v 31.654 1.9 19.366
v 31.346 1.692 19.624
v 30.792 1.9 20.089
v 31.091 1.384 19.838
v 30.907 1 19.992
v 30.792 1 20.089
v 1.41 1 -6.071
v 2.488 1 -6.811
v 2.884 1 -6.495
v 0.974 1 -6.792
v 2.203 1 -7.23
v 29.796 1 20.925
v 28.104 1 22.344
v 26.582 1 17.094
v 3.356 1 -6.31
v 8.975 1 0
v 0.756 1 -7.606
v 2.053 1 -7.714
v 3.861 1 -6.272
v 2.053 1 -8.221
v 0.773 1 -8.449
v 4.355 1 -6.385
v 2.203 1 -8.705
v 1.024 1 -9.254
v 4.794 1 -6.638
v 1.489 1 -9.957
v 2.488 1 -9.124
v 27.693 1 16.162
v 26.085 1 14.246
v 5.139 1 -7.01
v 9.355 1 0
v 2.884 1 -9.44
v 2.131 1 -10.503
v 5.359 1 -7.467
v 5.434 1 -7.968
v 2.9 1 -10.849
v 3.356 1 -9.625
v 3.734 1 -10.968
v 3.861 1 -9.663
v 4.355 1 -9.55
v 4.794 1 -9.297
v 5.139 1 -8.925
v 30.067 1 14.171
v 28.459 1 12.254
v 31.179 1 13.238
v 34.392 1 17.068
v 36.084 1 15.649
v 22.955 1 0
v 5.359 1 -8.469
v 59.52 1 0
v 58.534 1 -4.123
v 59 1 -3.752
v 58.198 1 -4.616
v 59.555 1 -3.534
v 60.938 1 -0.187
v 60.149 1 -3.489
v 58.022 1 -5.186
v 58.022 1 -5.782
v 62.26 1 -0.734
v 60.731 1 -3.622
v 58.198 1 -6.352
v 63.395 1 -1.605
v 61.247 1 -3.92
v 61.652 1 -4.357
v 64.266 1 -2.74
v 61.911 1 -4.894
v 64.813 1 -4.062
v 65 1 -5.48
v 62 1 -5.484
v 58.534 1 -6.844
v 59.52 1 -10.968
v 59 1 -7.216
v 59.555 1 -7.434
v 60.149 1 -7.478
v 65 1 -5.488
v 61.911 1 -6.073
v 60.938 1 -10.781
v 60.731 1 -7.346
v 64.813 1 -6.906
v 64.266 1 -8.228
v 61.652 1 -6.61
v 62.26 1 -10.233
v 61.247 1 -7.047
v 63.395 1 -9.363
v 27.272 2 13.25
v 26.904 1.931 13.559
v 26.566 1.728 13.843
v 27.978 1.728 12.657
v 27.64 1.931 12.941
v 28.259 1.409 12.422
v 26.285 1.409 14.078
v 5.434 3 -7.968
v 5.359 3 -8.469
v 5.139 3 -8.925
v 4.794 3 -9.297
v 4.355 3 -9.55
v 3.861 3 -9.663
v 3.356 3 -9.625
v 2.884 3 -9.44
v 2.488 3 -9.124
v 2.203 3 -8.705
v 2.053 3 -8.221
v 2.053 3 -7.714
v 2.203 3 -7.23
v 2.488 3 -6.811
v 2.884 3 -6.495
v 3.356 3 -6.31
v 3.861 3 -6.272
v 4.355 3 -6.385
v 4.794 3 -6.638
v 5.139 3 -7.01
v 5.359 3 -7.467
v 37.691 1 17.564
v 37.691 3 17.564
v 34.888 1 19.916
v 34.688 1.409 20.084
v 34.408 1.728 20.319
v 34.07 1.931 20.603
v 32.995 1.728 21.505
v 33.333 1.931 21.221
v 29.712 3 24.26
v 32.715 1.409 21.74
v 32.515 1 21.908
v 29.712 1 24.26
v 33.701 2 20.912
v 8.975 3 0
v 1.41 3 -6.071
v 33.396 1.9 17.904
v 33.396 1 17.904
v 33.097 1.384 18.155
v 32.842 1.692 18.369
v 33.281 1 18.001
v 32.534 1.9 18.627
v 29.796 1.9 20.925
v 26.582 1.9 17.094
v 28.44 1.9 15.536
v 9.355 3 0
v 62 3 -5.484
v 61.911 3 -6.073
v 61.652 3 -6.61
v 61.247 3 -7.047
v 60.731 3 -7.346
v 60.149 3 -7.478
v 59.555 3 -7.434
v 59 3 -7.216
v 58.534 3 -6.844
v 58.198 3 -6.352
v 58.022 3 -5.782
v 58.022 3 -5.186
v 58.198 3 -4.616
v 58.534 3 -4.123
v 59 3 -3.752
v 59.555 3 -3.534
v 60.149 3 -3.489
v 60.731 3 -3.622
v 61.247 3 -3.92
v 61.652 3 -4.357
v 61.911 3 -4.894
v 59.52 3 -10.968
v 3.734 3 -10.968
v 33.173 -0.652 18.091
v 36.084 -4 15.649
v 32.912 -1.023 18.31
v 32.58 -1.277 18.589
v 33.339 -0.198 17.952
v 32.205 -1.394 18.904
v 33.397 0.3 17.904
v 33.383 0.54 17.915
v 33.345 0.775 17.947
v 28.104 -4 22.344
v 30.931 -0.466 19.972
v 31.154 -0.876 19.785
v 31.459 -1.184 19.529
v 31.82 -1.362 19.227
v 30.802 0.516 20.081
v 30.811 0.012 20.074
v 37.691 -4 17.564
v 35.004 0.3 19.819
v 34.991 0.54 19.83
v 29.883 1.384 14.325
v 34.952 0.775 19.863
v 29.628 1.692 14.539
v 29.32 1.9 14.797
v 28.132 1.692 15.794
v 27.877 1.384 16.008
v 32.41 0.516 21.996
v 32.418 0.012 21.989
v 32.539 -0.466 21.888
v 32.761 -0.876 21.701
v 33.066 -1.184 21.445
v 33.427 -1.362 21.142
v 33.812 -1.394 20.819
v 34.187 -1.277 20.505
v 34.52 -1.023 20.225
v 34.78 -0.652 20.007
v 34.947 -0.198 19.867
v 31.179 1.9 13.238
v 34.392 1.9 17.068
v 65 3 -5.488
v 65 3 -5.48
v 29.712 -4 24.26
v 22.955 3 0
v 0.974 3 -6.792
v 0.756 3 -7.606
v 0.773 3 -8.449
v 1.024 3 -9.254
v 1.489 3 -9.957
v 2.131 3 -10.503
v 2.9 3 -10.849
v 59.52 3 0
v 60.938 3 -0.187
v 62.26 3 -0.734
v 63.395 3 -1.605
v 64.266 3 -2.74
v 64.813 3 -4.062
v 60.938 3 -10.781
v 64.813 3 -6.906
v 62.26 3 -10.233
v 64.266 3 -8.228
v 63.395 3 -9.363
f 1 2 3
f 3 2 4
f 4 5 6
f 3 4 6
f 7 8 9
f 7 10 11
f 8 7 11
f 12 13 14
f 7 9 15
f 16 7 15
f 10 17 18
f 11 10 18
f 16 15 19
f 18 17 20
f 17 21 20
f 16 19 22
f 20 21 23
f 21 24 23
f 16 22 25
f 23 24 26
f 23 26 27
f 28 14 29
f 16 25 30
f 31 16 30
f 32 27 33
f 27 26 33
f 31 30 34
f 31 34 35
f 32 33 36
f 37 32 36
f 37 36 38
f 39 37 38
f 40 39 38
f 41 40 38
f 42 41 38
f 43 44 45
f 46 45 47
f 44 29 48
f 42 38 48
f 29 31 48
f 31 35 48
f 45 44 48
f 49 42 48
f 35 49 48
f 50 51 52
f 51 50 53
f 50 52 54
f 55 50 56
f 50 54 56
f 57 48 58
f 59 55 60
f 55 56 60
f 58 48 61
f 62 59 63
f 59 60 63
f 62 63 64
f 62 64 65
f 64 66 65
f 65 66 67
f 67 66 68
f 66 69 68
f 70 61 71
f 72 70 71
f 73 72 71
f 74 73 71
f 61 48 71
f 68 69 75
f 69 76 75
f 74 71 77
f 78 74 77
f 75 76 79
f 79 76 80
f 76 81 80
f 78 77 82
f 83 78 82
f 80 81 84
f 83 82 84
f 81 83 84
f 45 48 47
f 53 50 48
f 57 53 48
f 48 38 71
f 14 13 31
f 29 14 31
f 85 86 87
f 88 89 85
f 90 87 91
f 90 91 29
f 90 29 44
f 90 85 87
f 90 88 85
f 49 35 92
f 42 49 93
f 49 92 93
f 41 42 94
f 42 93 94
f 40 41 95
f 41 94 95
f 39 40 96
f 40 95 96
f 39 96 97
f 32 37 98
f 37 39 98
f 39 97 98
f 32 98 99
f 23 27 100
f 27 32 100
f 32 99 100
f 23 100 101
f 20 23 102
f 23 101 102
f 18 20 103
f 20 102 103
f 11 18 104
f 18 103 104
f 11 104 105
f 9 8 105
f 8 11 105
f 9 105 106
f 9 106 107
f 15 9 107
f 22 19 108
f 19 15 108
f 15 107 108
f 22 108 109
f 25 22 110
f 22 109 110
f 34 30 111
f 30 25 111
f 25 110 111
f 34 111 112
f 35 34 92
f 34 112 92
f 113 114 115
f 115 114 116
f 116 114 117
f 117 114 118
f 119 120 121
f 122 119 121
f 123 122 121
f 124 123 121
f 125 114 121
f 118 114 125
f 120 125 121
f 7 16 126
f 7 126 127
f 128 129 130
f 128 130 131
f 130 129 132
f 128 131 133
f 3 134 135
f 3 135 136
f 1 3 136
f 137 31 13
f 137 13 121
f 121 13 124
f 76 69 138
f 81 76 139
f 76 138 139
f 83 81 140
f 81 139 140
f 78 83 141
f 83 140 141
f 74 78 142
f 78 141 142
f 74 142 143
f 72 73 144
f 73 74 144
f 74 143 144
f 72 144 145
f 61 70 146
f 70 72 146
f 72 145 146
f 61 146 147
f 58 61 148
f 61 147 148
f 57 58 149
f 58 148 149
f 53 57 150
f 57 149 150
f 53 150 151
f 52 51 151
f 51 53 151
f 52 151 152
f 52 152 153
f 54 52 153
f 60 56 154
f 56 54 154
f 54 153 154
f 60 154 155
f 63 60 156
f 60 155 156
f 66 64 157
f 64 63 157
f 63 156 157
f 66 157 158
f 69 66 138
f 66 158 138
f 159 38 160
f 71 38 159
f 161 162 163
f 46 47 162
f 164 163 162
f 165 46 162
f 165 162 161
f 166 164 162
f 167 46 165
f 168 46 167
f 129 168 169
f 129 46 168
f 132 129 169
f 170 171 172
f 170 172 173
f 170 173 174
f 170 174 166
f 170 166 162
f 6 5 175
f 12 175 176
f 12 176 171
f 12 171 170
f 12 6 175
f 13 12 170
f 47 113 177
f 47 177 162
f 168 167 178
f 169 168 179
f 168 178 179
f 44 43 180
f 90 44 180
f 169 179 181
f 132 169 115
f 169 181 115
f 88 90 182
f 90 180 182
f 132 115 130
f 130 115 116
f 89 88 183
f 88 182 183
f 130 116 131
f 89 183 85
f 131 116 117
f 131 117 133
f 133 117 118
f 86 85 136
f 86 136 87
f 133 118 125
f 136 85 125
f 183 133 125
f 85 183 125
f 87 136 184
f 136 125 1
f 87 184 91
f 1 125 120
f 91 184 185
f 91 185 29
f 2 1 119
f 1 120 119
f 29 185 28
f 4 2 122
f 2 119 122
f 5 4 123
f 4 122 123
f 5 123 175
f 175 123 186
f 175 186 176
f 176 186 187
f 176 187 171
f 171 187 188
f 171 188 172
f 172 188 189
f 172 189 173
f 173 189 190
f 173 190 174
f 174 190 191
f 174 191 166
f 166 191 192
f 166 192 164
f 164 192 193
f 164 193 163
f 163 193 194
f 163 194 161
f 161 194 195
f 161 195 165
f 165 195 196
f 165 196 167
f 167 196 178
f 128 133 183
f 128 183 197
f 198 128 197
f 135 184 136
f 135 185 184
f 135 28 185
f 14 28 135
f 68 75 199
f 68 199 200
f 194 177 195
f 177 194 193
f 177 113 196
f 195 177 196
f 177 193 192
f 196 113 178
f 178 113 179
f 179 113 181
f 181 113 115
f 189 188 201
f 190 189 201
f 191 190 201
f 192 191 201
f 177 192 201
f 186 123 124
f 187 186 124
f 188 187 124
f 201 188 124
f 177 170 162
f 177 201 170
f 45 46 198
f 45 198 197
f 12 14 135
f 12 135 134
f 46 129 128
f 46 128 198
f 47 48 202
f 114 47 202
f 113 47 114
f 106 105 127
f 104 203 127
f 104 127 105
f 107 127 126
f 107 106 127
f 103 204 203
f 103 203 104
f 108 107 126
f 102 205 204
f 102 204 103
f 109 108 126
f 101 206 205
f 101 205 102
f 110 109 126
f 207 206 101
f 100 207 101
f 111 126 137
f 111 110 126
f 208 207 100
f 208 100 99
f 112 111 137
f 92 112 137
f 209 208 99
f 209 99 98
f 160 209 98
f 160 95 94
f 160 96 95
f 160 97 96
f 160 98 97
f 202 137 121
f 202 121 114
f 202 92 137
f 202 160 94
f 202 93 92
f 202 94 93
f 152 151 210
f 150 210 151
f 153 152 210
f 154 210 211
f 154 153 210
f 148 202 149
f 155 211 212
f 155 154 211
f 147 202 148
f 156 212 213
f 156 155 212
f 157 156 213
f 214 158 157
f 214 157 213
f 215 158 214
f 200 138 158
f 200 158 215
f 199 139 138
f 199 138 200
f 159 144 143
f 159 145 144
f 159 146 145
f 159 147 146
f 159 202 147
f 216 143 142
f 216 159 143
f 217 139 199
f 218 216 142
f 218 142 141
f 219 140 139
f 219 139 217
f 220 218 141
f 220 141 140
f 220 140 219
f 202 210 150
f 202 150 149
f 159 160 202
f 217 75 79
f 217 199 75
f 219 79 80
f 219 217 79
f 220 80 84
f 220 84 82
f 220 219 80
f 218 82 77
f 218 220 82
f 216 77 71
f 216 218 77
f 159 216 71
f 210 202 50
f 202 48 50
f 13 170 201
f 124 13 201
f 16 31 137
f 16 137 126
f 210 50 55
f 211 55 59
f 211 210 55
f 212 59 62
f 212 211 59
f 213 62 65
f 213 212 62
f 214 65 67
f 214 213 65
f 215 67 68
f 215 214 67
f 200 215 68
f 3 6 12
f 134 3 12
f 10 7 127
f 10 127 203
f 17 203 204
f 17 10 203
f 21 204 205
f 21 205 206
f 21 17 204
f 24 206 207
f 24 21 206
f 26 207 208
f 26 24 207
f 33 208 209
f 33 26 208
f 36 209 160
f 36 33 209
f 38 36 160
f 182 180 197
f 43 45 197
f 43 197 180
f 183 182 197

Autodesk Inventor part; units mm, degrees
ref_plane "YZ Plane" through (0, 0, 0) normal (1, 0, 0) x (0, 1, 0)
ref_plane "XZ Plane" through (0, 0, 0) normal (0, 1, 0) x (-1, 0, 0)
ref_plane "XY Plane" through (0, 0, 0) normal (0, 0, 1) x (1, 0, 0)
sketch "Boceto1" plane through (0, 0, 0) normal (0, 1, 0) x (-1, 0, 0)
  line L0 (-2.031, 0) -> (-63, 0)
  line L1 (-65, -2) -> (-65, -8.0305)
  line L2 (-62.8998, -10.9676) -> (-2.0305, -10.9676)
  line L3 (0, -8.9987) -> (0, -2.031)
  line L4 (0, -8.9987) -> (0, -10.9676)
  line L5 (0, -10.9676) -> (-2.0305, -10.9676)
  line L6 (0, -2.031) -> (0, 0)
  line L7 (-65, -8.0305) -> (-65, -10.9676)
  line L8 (-65, -10.9676) -> (-62.8998, -10.9676)
  line L9 (-65, -2) -> (-65, 0)
  line L10 (-63, 0) -> (-65, 0)
  line L11 (0, 0) -> (-2.031, 0)
  dimension "d0" = 65
extrude "Extrusión1" add sketch "Boceto1" along normal blind 3
sketch "Boceto2" plane through (0, 3, 0) normal (0, 1, 0) x (1, 0, 0)
  line L0 (0, 10.9676) -> (0, 0) projected
  circle A0 centre (5, 5.4838) radius 2
  line L1 (65, 0) -> (65, 10.9676) projected
  circle A1 centre (60, 5.4838) radius 2
  line L2 (65, 5.4838) -> (60, 5.4838)
  line L3 (0, 5.4838) -> (5, 5.4838)
  point P0 (0.1384, 8.9976)
  point P1 (0.0312, 2.0308)
  point P2 (65, 2)
  point P3 (65, 8.0305)
  dimension "d20" = 5
  dimension "d31" = 4
  dimension "d32" = 4
extrude "Extrusión2" cut sketch "Boceto2" against normal blind 5
sketch "Boceto3" plane through (0, 3, 0) normal (0, 1, 0) x (1, 0, 0)
  circle A0 centre (5, 5.4838) radius 2 projected
  line L0 (5, 5.4838) -> (319.2562, 5.4838) construction
  line L1 (19.8683, -0.0721) -> (38.3706, -22.1223)
  line L2 (16.8683, -0.0721) -> (16.8078, 0)
  line L3 (11.4418, -7.1428) -> (5.4483, 0)
  line L4 (65, 0) -> (0, 0) projected
  line L5 (11.4418, -7.1428) -> (29.9441, -29.1929)
  line L6 (38.3706, -22.1223) -> (29.9441, -29.1929)
  line L7 (16.8078, 0) -> (19.8078, 0)
  line L8 (0, 0) -> (65, 0) projected
  dimension "d37" = 3
extrude "Extrusión3" add sketch "Boceto3" against normal blind 3
sketch "Boceto10" plane through (0, 3, 0) normal (0, 1, 0) x (1, 0, 0)
  line L0 (6.3645, 0) -> (-0.0991, 7.9201)
  line L1 (-0.0991, 7.9201) -> (0, 3)
  line L2 (2.4483, 0) -> (6.3645, 0)
  line L3 (65, 0) -> (0, 0) projected
  line L4 (2.4483, 0) -> (0, 0)
  line L5 (0, 0) -> (0, 3)
extrude "Extrusión9" cut sketch "Boceto10" against normal blind 39
fillet "Empalme8" radius 5.48 2 edges at (65, 1.5, 0) (65, 1.5, -10.9676)
fillet "Empalme10" radius 3 2 edges at (0, 1.5, -7.7987) (0, 1.5, -10.9676)
sketch "Boceto11" plane through (0, 3, 0) normal (0, 1, 0) x (1, 0, 0)
  line L0 (0, 0) -> (0, 10.9676) projected
  line L1 (0, 3) -> (0, 0)
  line L2 (0, 0) -> (2.4483, 0)
  line L3 (2.4483, 0) -> (0, 3) projected
  line L4 (2.4483, 0) -> (0, 3)
extrude "Extrusión10" cut sketch "Boceto11" against normal blind 57.75
sketch "Boceto13" plane through (0, 3, 0) normal (0, 1, 0) x (1, 0, 0)
  arc A0 (3.7344, 10.9676) -> (1.4102, 6.0708) centre (3.7344, 7.9676) ccw projected
  circle A1 centre (3.7344, 7.9676) radius 1.7
  point P0 (0, 0)
  dimension "d55" = 3.4
extrude "Extrusión12" cut sketch "Boceto13" against normal blind 8
sketch "Boceto14" plane through (0, 3, 0) normal (0, 1, 0) x (1, 0, 0)
  line L0 (29.4887, -24.4468) -> (8.9754, 0)
  line L1 (59.52, 0) -> (6.3645, 0) projected
  line L2 (37.9152, -17.3762) -> (23.3349, 0)
  line L3 (37.9152, -17.3762) -> (29.4887, -24.4468)
  line L4 (23.3349, 0) -> (8.9754, 0)
  point P0 (0, 0)
  point P1 (37.6687, -20.1938)
  point P2 (10.2808, 0)
extrude "Extrusión18" add sketch "Boceto14" against normal blind 2
sketch "Boceto19" plane through (0, 0, 0) normal (0, -1, 0) x (1, 0, 0)
  arc A0 (59.52, -10.9676) -> (65, -5.4876) centre (59.52, -5.4876) ccw projected
  arc A1 (1.4102, -6.0708) -> (3.7344, -10.9676) centre (3.7344, -7.9676) ccw projected
  line L0 (59.52, -10.9676) -> (3.7344, -10.9676)
  line L1 (6.3645, 0) -> (1.4102, -6.0708) projected
  line L2 (1.4102, -6.0708) -> (6.3645, 0)
  line L3 (6.3645, 0) -> (59.52, 0)
  arc A2 (59.52, -10.9676) -> (59.52, 0) centre (59.52, -5.4838) ccw
  line L4 (3.7344, -10.9676) -> (59.52, -10.9676) projected
  arc A3 (1.4102, -6.0708) -> (3.7344, -10.9676) centre (3.7344, -7.9676) ccw
  circle A4 centre (60, -5.4838) radius 2 projected
  circle A5 centre (60, -5.4838) radius 2
  circle A6 centre (3.7344, -7.9676) radius 1.7 projected
  circle A7 centre (3.7344, -7.9676) radius 1.6
  point P0 (0, 0)
extrude "Extrusión19" cut sketch "Boceto19" against normal blind 1 contours L1 L3 A2 L0 A1
sketch "Boceto20" plane through (0, 1, 0) normal (0, -1, 0) x (1, 0, 0)
  line L0 (29.4887, 24.4468) -> (8.9754, 0) projected
  line L1 (1.4102, -6.0708) -> (6.3645, 0) projected
  line L2 (8.9754, 0) -> (1.4102, -6.0708)
  line L3 (6.3645, 0) -> (8.9754, 0) projected
  line L4 (8.9754, 0) -> (6, 0)
  line L5 (6, 0) -> (1.4102, -6.0708)
  point P0 (0, 0)
extrude "Extrusión20" cut sketch "Boceto20" against normal blind 11.25 contours L1 L3 L2
sketch "Boceto21" plane through (0, 1, 0) normal (0, -1, 0) x (1, 0, 0)
  line L0 (29.4887, 24.4468) -> (8.9754, 0) projected
  line L1 (23.3349, 0) -> (8.9754, 0)
  line L2 (16.1551, 0) -> (22.9551, 0)
  line L3 (16.1551, 0) -> (9.3551, 0)
  line L4 (22.9551, 0) -> (37.6911, 17.5642)
  line L5 (37.9152, 17.3762) -> (29.4887, 24.4468) projected
  line L6 (37.6911, 17.5642) -> (37.9152, 17.3762)
  line L7 (23.3349, 0) -> (59.52, 0) projected
  line L8 (37.9152, 17.3762) -> (23.3349, 0)
  line L9 (23.3349, 0) -> (22.9551, 0)
  line L10 (9.3551, 0) -> (8.9754, 0)
  line L11 (9.3551, 0) -> (29.7116, 24.2599)
  line L12 (29.4887, 24.4468) -> (29.7116, 24.2599)
  point P0 (0, 0)
  dimension "d89" = 6.8
  dimension "d90" = 6.8
extrude "Extrusión21" cut sketch "Boceto21" against normal blind 11.25 contours L5 L11 L1 L0 | L5 L8 L1 L4
sketch "Boceto22" plane through (0, 1, 0) normal (0, -1, 0) x (1, 0, 0)
  line L0 (37.6911, 17.5642) -> (29.7116, 24.2599) projected
  line L1 (29.7116, 24.2599) -> (37.6911, 17.5642)
  line L2 (37.6911, 17.5642) -> (36.0843, 15.649)
  line L3 (22.9551, 0) -> (37.6911, 17.5642) projected
  line L4 (36.0843, 15.649) -> (28.1043, 22.3441)
  line L5 (28.1043, 22.3441) -> (29.7116, 24.2599)
  point P0 (0, 0)
  dimension "d94" = 2.5
extrude "Extrusión22" add sketch "Boceto22" along normal blind 5
sketch "Boceto23" plane through (37.6911, -4, 17.5642) normal (0.6427876, 0, 0.7660444) x (0.7660444, 0, -0.6427876)
  line L0 (-10.4166, 7) -> (0, 7) projected
  line L1 (-5.2083, 7) -> (-5.2081, 0)
  line L2 (-10.4164, 0) -> (0.0002, 0) projected
  line L3 (0.0002, 5) -> (-10.4164, 5) projected
  line L4 (-5.2081, 5) -> (-5.2083, 6)
  line L5 (-5.2083, 6) -> (-5.2082, 2.6)
  circle A0 centre (-5.2082, 4.3) radius 1.7
  point P0 (-17.583, 4)
  dimension "d97" = 3.4
extrude "Extrusión23" cut sketch "Boceto23" against normal blind 10
sketch "Boceto26" plane through (0, 1, 0) normal (0, -1, 0) x (1, 0, 0)
  line L0 (33.3965, 17.904) -> (30.7918, 20.0892) projected
  line L1 (32.0942, 18.9966) -> (29.7959, 20.9248)
  line L2 (29.7959, 20.9248) -> (34.3925, 17.0684)
  line L3 (36.0843, 15.649) -> (33.281, 18.0009) projected
  line L4 (34.3925, 17.0684) -> (31.1788, 13.2379)
  line L5 (31.1788, 13.2379) -> (26.5822, 17.0943)
  line L6 (26.5822, 17.0943) -> (29.7959, 20.9248)
  point P0 (0, 0)
  point P1 (30.9074, 19.9923)
  dimension "d103" = 3
  dimension "d104" = 6
  dimension "d106" = 5
extrude "Extrusión25" cut sketch "Boceto26" against normal blind 0.9
properties part number "ventilador controladora_suportV"
